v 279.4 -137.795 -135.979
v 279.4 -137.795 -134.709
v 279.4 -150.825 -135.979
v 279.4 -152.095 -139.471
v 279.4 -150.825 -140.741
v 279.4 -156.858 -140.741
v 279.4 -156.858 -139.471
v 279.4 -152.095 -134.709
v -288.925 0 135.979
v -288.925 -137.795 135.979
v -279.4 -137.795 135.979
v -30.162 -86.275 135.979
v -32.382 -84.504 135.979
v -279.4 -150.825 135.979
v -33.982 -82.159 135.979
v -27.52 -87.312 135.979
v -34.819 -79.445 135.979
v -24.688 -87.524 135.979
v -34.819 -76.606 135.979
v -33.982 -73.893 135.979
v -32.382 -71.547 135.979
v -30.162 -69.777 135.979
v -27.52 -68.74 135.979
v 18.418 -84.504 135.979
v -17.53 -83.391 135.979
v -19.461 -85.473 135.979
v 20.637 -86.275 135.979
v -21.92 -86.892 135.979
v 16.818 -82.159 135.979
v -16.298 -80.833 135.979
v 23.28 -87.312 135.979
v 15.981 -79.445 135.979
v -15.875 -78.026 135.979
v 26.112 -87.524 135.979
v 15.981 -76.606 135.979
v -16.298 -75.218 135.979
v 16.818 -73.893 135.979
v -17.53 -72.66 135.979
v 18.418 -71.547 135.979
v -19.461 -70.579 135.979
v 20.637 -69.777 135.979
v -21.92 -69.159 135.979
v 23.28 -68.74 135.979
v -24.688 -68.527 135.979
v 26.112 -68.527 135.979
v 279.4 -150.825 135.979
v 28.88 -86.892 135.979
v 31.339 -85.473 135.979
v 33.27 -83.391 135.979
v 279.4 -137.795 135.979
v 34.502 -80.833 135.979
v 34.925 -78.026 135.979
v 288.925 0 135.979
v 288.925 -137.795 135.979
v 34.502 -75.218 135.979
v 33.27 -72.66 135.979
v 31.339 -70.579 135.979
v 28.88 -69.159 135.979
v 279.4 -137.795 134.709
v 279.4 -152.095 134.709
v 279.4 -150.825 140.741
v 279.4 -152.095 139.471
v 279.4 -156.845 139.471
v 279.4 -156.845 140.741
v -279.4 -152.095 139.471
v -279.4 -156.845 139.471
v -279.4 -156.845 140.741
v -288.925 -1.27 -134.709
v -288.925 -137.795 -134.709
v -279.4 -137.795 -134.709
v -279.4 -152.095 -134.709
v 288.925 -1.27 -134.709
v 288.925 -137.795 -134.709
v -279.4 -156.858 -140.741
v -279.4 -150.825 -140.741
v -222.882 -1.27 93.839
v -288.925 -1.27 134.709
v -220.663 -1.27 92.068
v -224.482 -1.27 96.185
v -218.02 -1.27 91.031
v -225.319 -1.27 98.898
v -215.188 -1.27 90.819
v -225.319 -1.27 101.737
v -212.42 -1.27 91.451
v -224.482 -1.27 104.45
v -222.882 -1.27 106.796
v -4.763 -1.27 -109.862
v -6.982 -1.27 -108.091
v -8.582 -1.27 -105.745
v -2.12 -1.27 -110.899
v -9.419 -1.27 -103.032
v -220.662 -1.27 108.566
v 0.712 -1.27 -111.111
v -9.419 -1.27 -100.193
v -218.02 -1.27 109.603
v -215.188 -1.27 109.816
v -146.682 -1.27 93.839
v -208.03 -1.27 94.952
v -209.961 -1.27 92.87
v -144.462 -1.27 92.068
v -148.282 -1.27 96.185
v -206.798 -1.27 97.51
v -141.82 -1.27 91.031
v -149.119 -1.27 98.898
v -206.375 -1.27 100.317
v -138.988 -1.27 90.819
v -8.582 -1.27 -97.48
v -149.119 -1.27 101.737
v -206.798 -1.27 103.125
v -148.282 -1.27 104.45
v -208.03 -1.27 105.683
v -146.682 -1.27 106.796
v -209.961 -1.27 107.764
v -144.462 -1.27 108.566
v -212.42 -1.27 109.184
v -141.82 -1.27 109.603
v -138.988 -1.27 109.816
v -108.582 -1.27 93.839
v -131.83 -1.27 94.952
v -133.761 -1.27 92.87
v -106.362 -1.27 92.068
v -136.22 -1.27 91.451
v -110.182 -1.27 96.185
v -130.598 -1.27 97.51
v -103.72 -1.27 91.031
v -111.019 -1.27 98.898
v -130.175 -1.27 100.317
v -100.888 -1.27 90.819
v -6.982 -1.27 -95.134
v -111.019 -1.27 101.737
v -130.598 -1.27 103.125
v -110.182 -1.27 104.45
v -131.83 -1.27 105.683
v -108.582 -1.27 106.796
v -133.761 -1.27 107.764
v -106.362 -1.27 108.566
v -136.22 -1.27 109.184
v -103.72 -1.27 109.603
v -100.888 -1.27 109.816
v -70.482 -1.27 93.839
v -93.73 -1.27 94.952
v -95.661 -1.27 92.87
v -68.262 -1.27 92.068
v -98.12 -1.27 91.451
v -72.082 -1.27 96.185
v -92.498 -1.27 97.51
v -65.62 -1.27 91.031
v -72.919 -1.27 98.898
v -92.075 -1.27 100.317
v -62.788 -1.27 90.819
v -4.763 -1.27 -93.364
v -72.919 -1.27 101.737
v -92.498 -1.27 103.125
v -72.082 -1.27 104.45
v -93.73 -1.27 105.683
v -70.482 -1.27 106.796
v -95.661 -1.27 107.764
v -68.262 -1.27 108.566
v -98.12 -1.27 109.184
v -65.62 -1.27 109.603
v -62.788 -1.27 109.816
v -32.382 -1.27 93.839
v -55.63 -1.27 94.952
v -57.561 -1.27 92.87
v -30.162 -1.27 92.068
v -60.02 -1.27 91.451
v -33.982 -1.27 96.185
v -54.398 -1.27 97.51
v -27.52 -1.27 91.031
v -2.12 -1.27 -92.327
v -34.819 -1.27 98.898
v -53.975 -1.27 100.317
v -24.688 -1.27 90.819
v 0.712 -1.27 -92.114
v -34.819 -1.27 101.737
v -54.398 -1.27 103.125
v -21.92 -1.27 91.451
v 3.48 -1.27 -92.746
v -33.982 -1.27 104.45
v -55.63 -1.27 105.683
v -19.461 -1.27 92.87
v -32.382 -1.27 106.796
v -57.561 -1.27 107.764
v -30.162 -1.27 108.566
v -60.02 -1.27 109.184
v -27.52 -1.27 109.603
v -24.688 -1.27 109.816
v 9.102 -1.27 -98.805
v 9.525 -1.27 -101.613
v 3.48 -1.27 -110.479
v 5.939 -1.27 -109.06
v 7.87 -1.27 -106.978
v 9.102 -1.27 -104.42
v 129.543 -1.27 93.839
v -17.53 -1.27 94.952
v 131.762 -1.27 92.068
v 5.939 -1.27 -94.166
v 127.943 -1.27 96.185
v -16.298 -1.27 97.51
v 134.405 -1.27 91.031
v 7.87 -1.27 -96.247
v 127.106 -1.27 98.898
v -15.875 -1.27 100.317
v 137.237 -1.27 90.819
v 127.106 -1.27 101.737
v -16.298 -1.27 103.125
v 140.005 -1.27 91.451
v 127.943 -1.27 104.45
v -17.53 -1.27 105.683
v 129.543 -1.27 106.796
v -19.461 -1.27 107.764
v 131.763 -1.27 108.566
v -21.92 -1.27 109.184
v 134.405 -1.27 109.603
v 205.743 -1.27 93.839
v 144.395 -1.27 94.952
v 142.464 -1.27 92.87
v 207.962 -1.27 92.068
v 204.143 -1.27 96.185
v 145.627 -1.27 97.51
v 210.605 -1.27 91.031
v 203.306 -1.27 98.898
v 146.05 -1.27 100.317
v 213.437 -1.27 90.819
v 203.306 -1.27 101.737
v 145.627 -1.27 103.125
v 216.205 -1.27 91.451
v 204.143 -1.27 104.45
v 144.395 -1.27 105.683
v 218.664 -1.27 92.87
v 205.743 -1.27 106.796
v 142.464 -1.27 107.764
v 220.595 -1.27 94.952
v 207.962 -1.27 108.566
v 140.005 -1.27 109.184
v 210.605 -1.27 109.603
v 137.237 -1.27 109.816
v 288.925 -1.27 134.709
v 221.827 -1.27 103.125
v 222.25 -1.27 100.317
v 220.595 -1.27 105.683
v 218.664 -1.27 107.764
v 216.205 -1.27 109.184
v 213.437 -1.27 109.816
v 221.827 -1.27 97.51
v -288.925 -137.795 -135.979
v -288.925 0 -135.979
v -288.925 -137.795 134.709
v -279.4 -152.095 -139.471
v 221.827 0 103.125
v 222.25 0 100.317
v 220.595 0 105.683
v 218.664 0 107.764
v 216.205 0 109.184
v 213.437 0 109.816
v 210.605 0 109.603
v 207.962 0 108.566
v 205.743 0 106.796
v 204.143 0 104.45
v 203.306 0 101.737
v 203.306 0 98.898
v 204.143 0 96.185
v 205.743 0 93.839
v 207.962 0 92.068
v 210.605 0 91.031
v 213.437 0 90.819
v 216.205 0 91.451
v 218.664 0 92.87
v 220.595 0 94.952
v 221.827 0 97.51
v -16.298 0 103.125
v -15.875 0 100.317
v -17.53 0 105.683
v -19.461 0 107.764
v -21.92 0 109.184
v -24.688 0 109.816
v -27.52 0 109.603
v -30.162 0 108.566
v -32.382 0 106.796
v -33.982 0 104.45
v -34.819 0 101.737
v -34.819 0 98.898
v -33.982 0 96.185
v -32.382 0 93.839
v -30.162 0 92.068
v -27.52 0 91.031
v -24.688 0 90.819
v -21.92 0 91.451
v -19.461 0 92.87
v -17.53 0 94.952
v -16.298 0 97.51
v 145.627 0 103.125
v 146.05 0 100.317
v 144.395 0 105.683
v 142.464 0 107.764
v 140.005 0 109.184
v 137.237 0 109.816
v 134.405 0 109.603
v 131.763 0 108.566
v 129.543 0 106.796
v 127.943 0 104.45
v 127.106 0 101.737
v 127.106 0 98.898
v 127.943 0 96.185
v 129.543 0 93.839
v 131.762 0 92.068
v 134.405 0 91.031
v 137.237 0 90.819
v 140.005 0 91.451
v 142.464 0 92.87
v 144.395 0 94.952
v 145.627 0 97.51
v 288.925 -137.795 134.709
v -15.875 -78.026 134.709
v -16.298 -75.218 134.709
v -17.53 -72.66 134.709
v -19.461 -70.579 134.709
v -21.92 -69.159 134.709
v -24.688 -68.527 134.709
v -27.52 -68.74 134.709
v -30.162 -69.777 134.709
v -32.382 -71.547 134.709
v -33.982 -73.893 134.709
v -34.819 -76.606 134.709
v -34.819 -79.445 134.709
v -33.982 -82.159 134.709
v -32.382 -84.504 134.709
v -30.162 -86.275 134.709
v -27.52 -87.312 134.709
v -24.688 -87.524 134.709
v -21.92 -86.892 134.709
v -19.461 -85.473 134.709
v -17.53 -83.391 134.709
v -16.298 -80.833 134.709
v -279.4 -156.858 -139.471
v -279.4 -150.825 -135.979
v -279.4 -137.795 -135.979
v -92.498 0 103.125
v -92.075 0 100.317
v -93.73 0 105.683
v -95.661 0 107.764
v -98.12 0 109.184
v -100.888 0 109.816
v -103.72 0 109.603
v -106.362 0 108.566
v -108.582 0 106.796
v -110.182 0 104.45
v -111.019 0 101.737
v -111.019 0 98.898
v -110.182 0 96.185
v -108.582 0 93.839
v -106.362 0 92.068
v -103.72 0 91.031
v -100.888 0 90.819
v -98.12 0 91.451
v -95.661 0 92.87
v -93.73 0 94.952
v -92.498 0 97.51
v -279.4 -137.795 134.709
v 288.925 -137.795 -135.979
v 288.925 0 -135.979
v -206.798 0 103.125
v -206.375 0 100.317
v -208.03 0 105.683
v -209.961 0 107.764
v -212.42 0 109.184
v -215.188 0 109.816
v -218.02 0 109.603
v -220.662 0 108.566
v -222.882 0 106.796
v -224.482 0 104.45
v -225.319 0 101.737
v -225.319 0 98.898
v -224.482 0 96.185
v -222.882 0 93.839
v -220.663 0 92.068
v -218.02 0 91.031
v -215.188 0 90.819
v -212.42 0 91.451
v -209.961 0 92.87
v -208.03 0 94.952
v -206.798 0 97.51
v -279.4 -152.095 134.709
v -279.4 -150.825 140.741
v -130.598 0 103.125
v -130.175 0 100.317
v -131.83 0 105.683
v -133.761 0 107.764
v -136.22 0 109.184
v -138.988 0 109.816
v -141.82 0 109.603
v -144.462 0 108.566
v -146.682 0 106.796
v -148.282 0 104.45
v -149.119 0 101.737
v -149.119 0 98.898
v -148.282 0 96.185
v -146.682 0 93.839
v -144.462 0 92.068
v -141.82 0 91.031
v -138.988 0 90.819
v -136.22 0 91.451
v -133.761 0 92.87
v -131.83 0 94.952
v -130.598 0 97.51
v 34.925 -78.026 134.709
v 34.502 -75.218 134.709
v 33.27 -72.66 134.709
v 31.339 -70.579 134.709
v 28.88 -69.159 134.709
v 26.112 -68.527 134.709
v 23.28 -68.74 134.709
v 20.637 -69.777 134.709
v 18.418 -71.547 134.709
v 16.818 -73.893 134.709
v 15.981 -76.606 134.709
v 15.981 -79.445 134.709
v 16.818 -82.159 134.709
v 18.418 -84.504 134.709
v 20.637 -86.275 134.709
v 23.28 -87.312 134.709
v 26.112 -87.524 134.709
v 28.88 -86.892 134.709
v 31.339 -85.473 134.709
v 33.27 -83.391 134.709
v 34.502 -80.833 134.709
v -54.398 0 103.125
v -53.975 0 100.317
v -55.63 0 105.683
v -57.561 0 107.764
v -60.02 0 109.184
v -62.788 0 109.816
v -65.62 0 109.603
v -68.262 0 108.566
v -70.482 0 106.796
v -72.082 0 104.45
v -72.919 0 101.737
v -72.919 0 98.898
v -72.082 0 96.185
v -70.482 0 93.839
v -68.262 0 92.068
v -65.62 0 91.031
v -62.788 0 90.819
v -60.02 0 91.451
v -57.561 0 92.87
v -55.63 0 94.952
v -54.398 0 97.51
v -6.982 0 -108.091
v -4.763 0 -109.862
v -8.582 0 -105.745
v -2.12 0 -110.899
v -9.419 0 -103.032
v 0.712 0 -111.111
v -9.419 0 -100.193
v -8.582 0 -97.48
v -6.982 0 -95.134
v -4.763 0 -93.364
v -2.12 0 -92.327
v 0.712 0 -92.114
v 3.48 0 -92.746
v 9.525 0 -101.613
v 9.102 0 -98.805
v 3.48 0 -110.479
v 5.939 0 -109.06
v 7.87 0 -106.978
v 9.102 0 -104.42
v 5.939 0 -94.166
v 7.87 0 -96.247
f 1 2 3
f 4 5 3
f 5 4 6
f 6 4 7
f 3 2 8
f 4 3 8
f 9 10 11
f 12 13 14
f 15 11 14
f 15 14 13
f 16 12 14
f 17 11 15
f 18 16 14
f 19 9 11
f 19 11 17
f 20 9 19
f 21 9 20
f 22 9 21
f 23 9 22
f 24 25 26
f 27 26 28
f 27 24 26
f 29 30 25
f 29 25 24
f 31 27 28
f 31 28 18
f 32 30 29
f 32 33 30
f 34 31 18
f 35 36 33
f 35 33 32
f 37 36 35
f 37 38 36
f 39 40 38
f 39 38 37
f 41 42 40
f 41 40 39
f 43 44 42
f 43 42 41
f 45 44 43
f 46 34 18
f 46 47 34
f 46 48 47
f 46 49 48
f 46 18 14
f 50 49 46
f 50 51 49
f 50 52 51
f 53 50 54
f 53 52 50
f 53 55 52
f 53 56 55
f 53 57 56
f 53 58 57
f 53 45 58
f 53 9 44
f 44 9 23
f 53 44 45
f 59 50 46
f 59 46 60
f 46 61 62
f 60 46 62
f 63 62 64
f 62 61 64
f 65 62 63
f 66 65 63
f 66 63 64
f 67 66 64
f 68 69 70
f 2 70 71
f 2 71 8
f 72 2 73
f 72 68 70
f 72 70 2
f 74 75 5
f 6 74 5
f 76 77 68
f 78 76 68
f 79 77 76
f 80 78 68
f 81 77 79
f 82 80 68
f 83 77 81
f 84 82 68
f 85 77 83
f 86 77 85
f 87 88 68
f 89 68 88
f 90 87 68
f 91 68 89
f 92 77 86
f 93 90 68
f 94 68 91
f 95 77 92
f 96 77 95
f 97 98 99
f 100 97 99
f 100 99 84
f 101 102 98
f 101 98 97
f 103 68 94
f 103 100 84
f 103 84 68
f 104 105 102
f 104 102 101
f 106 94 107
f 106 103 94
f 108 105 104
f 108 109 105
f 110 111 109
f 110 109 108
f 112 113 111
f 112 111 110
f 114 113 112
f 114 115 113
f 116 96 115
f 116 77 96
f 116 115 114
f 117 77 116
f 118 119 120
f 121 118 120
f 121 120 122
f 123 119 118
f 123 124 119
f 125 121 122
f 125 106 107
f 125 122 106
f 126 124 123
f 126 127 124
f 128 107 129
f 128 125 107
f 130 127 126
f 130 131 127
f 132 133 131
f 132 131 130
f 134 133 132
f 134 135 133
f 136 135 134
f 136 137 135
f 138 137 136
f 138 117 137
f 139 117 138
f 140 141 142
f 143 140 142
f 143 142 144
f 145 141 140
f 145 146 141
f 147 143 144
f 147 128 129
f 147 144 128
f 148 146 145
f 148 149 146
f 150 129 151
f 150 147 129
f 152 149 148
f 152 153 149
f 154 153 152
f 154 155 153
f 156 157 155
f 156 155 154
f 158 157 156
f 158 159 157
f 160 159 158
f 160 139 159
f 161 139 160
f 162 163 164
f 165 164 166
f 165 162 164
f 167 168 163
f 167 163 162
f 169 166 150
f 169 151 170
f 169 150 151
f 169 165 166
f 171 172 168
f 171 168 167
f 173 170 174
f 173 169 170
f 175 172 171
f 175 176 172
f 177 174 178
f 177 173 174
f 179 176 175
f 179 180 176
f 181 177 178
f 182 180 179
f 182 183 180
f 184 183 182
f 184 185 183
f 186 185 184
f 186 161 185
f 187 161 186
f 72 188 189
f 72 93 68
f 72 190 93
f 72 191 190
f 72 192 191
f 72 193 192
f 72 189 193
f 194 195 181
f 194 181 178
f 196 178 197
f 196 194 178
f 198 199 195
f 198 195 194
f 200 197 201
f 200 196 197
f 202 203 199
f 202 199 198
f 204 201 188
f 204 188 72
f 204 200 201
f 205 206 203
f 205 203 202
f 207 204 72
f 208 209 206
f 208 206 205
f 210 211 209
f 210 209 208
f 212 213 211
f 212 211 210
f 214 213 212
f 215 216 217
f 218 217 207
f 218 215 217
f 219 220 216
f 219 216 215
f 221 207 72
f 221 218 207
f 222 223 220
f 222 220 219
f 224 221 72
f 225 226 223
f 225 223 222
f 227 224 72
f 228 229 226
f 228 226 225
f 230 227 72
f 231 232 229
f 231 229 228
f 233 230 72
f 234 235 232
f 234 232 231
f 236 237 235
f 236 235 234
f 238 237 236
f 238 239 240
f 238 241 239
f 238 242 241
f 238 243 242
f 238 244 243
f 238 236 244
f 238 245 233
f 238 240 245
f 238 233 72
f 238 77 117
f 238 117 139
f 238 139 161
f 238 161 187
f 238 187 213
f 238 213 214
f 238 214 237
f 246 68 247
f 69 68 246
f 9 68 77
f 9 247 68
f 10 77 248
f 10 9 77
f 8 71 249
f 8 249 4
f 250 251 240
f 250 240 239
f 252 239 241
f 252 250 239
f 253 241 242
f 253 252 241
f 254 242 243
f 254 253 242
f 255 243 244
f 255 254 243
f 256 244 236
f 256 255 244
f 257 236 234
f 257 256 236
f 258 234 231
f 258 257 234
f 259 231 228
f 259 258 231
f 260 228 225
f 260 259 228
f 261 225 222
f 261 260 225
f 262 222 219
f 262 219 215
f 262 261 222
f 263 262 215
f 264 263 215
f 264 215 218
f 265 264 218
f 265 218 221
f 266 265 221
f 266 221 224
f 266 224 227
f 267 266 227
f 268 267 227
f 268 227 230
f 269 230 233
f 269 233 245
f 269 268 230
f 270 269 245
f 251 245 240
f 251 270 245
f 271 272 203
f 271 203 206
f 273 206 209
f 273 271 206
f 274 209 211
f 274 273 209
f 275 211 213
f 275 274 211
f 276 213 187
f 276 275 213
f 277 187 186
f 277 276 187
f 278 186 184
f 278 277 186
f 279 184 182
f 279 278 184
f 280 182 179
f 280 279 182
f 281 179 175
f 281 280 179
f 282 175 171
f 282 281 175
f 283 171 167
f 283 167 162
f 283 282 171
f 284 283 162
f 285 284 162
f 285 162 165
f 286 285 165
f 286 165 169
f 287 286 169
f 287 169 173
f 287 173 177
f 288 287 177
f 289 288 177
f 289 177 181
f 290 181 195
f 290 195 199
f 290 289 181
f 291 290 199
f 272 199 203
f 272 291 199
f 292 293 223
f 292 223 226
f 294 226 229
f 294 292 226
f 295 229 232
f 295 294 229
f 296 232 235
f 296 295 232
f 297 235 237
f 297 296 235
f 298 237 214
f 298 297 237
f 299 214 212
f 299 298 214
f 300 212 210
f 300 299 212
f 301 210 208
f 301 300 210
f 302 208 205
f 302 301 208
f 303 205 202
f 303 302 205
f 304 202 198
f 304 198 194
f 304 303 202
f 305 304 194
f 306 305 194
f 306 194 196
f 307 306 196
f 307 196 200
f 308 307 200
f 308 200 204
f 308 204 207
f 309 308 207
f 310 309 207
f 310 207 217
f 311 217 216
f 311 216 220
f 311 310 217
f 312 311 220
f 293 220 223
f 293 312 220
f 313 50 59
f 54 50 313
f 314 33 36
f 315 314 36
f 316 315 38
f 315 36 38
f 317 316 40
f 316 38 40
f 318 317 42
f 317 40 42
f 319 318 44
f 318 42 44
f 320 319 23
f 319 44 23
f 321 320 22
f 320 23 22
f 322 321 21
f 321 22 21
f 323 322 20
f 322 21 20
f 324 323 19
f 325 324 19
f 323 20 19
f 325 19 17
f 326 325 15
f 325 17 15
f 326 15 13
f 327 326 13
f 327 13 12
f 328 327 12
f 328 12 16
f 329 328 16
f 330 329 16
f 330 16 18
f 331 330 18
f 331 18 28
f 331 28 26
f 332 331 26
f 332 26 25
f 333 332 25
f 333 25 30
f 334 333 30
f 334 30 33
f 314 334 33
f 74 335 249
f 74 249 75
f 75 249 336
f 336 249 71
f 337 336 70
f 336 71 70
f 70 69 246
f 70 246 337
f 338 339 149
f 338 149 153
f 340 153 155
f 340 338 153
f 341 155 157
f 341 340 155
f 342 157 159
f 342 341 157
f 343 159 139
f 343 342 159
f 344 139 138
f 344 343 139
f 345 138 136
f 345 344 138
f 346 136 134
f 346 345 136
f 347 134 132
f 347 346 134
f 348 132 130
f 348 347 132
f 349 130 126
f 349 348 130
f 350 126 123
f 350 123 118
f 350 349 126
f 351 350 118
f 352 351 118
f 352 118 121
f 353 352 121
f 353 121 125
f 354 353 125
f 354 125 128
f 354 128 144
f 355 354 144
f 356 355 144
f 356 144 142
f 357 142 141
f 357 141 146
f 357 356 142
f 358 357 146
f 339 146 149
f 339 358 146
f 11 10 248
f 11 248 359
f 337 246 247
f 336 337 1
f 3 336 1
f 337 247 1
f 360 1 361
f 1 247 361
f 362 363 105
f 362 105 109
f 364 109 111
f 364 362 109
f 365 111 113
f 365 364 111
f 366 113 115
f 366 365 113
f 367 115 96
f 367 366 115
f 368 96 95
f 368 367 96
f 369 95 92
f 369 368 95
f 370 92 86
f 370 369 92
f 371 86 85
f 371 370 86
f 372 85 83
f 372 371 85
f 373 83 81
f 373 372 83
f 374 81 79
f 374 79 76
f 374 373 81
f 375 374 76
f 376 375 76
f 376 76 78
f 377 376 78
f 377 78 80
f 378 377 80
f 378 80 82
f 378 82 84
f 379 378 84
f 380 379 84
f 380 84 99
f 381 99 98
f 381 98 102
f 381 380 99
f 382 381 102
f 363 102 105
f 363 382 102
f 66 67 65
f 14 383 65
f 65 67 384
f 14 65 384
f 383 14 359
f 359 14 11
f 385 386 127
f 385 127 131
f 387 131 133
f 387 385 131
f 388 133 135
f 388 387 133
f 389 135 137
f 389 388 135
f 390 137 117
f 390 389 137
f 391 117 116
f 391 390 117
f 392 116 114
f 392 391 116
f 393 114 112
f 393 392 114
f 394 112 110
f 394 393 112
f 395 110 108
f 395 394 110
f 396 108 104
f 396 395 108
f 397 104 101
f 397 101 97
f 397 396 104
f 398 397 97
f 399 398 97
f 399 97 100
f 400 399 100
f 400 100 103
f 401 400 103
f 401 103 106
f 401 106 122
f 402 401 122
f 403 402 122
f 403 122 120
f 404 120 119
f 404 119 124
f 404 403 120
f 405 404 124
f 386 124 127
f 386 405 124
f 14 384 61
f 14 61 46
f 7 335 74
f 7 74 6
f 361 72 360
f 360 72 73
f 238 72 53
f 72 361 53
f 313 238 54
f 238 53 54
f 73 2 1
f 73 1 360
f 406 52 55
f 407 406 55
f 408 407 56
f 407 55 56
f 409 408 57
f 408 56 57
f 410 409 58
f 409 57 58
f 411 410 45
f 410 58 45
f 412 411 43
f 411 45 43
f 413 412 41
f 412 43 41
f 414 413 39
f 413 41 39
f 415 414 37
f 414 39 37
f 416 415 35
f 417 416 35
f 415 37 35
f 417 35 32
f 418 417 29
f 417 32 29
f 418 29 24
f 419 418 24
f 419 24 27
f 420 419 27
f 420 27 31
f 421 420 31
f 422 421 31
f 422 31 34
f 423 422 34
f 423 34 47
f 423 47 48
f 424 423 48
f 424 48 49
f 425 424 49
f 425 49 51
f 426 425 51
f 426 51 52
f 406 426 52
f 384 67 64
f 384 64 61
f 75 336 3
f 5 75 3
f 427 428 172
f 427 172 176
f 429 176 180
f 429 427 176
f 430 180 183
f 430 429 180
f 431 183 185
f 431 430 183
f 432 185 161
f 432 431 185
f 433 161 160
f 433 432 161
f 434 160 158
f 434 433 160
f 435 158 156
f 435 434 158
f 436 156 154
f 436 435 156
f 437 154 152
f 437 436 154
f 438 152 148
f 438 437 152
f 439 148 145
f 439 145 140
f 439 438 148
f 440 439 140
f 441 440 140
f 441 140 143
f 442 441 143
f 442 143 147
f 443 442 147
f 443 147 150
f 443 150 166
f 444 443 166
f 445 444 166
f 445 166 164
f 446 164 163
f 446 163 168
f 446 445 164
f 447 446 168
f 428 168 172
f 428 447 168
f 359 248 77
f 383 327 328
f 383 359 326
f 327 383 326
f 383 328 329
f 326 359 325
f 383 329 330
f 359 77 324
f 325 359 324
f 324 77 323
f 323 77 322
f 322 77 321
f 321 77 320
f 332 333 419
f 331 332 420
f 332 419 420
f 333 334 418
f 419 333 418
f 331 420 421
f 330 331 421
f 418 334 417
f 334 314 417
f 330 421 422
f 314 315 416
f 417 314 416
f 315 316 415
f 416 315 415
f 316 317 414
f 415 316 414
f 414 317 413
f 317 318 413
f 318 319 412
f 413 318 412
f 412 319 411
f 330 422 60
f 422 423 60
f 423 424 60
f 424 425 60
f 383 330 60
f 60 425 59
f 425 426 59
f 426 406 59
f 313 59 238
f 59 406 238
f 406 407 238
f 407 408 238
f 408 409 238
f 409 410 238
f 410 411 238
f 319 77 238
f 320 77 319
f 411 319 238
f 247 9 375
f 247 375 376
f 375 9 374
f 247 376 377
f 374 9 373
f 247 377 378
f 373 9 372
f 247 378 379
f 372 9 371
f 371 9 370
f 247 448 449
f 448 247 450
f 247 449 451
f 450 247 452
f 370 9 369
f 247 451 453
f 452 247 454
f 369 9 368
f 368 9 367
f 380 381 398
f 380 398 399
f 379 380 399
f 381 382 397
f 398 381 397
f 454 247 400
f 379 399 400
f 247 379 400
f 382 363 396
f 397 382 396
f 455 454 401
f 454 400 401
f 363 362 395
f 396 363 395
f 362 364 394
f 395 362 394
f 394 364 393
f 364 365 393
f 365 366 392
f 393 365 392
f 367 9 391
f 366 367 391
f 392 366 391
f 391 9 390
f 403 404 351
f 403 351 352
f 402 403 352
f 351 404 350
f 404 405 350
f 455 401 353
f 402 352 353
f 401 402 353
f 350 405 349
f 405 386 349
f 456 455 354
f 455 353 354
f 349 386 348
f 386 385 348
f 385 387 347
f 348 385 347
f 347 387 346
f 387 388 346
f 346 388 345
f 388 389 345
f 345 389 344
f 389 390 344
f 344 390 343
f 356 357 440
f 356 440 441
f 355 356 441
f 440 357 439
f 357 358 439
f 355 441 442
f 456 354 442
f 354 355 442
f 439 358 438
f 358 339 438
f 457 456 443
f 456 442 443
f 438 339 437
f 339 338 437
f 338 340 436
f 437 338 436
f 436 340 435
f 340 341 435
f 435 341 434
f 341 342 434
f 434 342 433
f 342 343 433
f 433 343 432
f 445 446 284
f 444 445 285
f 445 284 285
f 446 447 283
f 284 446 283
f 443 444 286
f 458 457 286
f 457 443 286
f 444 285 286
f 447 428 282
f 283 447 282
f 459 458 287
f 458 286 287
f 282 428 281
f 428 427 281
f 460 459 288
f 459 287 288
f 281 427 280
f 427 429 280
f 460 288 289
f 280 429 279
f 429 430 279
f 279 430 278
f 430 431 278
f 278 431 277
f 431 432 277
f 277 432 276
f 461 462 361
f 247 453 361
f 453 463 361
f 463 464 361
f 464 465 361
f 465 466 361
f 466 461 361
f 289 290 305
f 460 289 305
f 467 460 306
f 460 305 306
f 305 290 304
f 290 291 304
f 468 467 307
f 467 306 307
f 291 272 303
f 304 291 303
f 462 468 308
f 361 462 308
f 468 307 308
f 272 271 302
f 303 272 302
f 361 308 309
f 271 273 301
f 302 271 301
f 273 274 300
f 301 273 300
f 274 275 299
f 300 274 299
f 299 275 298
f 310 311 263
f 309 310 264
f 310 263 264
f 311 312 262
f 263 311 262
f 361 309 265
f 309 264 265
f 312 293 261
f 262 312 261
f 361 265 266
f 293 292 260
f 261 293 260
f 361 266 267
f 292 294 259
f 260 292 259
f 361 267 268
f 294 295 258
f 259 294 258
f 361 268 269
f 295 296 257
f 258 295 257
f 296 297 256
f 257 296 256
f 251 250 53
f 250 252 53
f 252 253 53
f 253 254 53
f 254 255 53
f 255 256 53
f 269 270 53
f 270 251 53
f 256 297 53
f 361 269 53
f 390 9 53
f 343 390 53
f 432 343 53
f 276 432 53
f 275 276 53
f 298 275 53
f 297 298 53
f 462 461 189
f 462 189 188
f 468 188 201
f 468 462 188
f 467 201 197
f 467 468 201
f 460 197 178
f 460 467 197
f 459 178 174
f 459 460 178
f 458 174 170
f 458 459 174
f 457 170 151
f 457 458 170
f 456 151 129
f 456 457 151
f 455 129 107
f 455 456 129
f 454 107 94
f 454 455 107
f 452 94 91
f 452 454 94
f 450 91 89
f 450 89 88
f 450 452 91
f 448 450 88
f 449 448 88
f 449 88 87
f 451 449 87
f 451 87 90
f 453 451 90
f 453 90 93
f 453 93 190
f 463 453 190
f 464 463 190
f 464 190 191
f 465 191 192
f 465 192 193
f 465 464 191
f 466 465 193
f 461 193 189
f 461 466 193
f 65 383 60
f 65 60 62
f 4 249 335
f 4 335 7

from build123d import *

# Parameters (mm, degrees)
F0_R      = 9.525
F1_DEPTH  = 1.27
F2_W      = 577.85
F2_H      = 1.27
F3_DEPTH  = 150.8252
F4_W      = 577.85
F4_H      = 1.27
F5_DEPTH  = 4.7625
F6_W      = 577.85
F6_H      = 1.27
F7_DEPTH  = 4.7625
F9_DEPTH  = 577.85
F10_DEPTH = 25.4
F11_R     = 9.525
F12_DEPTH = 25.4
F13_W     = 9.525
F13_H     = 19.05
F14_DEPTH = 281.4838


with BuildPart() as f1:
    # F0 (on Front) → F1 (new body)
    with BuildSketch(Plane.XZ):
        Polygon((279.4, 287.3629), (-279.4, 287.3629), (-279.4, 264.2743), (-288.925, 264.2743), (-288.925, -264.2743), (-279.4, -264.2743), (-279.4, -287.3629), (279.4, -287.3629), (279.4, -264.2743), (288.925, -264.2743), (288.925, 264.2743), (279.4, 264.2743), align=None)
        with Locations((0, -101.6127)):
            Circle(F0_R, mode=Mode.SUBTRACT)
        with Locations((-215.9, 100.3173)):
            Circle(F0_R, mode=Mode.SUBTRACT)
        with Locations((-139.7, 100.3173)):
            Circle(F0_R, mode=Mode.SUBTRACT)
        with Locations((-101.6, 100.3173)):
            Circle(F0_R, mode=Mode.SUBTRACT)
        with Locations((-63.5, 100.3173)):
            Circle(F0_R, mode=Mode.SUBTRACT)
        with Locations((-25.4, 100.3173)):
            Circle(F0_R, mode=Mode.SUBTRACT)
        with Locations((136.525, 100.3173)):
            Circle(F0_R, mode=Mode.SUBTRACT)
        with Locations((212.725, 100.3173)):
            Circle(F0_R, mode=Mode.SUBTRACT)
    extrude(amount=F1_DEPTH)

    # F2 (on face) → F3 (join)
    with BuildSketch(Plane.XZ.offset(1.27)):
        with Locations((0, 135.3439)):
            Rectangle(F2_W, F2_H)
        with Locations((0, -135.3439)):
            Rectangle(F2_W, F2_H)
    extrude(amount=F3_DEPTH)

    # F4 (on face) → F5 (join)
    with BuildSketch(Plane(origin=(0, 0, -135.9789), x_dir=(1, 0, 0), z_dir=(0, 0, -1))):
        with Locations((0, 151.4602)):
            Rectangle(F4_W, F4_H)
    extrude(amount=F5_DEPTH)

    # F6 (on face) → F7 (join)
    with BuildSketch(Plane.XZ.offset(152.0952)):
        with Locations((0, -140.1064)):
            Rectangle(F6_W, F6_H)
    extrude(amount=F7_DEPTH)

    # F8 (on face) → F9 (join)
    with BuildSketch(Plane(origin=(-288.925, 0, 0), x_dir=(0, -1, 0), z_dir=(-1, 0, 0))):
        Polygon((150.8252, 140.7414), (150.8252, 135.9789), (152.0952, 135.9789), (152.0952, 139.4714), (156.845, 139.4714), (156.845, 140.7414), align=None)
    extrude(amount=-F9_DEPTH)

    # F10 (cut): faces of the model
    f10_faces = [f1.faces().sort_by_distance(p)[0] for p in [
        (0, -1.27, -211.346733802),
        (0, -1.27, 211.346733802),
    ]]
    extrude(f10_faces, amount=-F10_DEPTH, mode=Mode.SUBTRACT)

    # F11 (on face) → F12 (cut)
    with BuildSketch(Plane.XY.offset(135.9789)):
        with Locations((25.4, -78.0257880688)):
            Circle(F11_R)
        with Locations((-25.4, -78.0257880688)):
            Circle(F11_R)
    extrude(amount=-F12_DEPTH, mode=Mode.SUBTRACT)

    # F13 (on face) → F14 (cut, through all)
    with BuildSketch(Plane.XY.offset(140.7414)):
        with Locations((-284.1625, -147.32)):
            Rectangle(F13_W, F13_H)
        Polygon((-279.4, -156.845), (-288.925, -156.845), (-289.9772524834, -156.845), (-289.9772524834, -157.6761454344), (-279.4, -157.6761454344), align=None)
        Polygon((292.2254502773, -156.845), (288.925, -156.845), (279.4, -156.845), (279.4, -157.6761454344), (292.2254502773, -157.6761454344), align=None)
        with Locations((284.1625, -147.32)):
            Rectangle(F13_W, F13_H)
    extrude(amount=-F14_DEPTH, mode=Mode.SUBTRACT)


solid = f1.part
